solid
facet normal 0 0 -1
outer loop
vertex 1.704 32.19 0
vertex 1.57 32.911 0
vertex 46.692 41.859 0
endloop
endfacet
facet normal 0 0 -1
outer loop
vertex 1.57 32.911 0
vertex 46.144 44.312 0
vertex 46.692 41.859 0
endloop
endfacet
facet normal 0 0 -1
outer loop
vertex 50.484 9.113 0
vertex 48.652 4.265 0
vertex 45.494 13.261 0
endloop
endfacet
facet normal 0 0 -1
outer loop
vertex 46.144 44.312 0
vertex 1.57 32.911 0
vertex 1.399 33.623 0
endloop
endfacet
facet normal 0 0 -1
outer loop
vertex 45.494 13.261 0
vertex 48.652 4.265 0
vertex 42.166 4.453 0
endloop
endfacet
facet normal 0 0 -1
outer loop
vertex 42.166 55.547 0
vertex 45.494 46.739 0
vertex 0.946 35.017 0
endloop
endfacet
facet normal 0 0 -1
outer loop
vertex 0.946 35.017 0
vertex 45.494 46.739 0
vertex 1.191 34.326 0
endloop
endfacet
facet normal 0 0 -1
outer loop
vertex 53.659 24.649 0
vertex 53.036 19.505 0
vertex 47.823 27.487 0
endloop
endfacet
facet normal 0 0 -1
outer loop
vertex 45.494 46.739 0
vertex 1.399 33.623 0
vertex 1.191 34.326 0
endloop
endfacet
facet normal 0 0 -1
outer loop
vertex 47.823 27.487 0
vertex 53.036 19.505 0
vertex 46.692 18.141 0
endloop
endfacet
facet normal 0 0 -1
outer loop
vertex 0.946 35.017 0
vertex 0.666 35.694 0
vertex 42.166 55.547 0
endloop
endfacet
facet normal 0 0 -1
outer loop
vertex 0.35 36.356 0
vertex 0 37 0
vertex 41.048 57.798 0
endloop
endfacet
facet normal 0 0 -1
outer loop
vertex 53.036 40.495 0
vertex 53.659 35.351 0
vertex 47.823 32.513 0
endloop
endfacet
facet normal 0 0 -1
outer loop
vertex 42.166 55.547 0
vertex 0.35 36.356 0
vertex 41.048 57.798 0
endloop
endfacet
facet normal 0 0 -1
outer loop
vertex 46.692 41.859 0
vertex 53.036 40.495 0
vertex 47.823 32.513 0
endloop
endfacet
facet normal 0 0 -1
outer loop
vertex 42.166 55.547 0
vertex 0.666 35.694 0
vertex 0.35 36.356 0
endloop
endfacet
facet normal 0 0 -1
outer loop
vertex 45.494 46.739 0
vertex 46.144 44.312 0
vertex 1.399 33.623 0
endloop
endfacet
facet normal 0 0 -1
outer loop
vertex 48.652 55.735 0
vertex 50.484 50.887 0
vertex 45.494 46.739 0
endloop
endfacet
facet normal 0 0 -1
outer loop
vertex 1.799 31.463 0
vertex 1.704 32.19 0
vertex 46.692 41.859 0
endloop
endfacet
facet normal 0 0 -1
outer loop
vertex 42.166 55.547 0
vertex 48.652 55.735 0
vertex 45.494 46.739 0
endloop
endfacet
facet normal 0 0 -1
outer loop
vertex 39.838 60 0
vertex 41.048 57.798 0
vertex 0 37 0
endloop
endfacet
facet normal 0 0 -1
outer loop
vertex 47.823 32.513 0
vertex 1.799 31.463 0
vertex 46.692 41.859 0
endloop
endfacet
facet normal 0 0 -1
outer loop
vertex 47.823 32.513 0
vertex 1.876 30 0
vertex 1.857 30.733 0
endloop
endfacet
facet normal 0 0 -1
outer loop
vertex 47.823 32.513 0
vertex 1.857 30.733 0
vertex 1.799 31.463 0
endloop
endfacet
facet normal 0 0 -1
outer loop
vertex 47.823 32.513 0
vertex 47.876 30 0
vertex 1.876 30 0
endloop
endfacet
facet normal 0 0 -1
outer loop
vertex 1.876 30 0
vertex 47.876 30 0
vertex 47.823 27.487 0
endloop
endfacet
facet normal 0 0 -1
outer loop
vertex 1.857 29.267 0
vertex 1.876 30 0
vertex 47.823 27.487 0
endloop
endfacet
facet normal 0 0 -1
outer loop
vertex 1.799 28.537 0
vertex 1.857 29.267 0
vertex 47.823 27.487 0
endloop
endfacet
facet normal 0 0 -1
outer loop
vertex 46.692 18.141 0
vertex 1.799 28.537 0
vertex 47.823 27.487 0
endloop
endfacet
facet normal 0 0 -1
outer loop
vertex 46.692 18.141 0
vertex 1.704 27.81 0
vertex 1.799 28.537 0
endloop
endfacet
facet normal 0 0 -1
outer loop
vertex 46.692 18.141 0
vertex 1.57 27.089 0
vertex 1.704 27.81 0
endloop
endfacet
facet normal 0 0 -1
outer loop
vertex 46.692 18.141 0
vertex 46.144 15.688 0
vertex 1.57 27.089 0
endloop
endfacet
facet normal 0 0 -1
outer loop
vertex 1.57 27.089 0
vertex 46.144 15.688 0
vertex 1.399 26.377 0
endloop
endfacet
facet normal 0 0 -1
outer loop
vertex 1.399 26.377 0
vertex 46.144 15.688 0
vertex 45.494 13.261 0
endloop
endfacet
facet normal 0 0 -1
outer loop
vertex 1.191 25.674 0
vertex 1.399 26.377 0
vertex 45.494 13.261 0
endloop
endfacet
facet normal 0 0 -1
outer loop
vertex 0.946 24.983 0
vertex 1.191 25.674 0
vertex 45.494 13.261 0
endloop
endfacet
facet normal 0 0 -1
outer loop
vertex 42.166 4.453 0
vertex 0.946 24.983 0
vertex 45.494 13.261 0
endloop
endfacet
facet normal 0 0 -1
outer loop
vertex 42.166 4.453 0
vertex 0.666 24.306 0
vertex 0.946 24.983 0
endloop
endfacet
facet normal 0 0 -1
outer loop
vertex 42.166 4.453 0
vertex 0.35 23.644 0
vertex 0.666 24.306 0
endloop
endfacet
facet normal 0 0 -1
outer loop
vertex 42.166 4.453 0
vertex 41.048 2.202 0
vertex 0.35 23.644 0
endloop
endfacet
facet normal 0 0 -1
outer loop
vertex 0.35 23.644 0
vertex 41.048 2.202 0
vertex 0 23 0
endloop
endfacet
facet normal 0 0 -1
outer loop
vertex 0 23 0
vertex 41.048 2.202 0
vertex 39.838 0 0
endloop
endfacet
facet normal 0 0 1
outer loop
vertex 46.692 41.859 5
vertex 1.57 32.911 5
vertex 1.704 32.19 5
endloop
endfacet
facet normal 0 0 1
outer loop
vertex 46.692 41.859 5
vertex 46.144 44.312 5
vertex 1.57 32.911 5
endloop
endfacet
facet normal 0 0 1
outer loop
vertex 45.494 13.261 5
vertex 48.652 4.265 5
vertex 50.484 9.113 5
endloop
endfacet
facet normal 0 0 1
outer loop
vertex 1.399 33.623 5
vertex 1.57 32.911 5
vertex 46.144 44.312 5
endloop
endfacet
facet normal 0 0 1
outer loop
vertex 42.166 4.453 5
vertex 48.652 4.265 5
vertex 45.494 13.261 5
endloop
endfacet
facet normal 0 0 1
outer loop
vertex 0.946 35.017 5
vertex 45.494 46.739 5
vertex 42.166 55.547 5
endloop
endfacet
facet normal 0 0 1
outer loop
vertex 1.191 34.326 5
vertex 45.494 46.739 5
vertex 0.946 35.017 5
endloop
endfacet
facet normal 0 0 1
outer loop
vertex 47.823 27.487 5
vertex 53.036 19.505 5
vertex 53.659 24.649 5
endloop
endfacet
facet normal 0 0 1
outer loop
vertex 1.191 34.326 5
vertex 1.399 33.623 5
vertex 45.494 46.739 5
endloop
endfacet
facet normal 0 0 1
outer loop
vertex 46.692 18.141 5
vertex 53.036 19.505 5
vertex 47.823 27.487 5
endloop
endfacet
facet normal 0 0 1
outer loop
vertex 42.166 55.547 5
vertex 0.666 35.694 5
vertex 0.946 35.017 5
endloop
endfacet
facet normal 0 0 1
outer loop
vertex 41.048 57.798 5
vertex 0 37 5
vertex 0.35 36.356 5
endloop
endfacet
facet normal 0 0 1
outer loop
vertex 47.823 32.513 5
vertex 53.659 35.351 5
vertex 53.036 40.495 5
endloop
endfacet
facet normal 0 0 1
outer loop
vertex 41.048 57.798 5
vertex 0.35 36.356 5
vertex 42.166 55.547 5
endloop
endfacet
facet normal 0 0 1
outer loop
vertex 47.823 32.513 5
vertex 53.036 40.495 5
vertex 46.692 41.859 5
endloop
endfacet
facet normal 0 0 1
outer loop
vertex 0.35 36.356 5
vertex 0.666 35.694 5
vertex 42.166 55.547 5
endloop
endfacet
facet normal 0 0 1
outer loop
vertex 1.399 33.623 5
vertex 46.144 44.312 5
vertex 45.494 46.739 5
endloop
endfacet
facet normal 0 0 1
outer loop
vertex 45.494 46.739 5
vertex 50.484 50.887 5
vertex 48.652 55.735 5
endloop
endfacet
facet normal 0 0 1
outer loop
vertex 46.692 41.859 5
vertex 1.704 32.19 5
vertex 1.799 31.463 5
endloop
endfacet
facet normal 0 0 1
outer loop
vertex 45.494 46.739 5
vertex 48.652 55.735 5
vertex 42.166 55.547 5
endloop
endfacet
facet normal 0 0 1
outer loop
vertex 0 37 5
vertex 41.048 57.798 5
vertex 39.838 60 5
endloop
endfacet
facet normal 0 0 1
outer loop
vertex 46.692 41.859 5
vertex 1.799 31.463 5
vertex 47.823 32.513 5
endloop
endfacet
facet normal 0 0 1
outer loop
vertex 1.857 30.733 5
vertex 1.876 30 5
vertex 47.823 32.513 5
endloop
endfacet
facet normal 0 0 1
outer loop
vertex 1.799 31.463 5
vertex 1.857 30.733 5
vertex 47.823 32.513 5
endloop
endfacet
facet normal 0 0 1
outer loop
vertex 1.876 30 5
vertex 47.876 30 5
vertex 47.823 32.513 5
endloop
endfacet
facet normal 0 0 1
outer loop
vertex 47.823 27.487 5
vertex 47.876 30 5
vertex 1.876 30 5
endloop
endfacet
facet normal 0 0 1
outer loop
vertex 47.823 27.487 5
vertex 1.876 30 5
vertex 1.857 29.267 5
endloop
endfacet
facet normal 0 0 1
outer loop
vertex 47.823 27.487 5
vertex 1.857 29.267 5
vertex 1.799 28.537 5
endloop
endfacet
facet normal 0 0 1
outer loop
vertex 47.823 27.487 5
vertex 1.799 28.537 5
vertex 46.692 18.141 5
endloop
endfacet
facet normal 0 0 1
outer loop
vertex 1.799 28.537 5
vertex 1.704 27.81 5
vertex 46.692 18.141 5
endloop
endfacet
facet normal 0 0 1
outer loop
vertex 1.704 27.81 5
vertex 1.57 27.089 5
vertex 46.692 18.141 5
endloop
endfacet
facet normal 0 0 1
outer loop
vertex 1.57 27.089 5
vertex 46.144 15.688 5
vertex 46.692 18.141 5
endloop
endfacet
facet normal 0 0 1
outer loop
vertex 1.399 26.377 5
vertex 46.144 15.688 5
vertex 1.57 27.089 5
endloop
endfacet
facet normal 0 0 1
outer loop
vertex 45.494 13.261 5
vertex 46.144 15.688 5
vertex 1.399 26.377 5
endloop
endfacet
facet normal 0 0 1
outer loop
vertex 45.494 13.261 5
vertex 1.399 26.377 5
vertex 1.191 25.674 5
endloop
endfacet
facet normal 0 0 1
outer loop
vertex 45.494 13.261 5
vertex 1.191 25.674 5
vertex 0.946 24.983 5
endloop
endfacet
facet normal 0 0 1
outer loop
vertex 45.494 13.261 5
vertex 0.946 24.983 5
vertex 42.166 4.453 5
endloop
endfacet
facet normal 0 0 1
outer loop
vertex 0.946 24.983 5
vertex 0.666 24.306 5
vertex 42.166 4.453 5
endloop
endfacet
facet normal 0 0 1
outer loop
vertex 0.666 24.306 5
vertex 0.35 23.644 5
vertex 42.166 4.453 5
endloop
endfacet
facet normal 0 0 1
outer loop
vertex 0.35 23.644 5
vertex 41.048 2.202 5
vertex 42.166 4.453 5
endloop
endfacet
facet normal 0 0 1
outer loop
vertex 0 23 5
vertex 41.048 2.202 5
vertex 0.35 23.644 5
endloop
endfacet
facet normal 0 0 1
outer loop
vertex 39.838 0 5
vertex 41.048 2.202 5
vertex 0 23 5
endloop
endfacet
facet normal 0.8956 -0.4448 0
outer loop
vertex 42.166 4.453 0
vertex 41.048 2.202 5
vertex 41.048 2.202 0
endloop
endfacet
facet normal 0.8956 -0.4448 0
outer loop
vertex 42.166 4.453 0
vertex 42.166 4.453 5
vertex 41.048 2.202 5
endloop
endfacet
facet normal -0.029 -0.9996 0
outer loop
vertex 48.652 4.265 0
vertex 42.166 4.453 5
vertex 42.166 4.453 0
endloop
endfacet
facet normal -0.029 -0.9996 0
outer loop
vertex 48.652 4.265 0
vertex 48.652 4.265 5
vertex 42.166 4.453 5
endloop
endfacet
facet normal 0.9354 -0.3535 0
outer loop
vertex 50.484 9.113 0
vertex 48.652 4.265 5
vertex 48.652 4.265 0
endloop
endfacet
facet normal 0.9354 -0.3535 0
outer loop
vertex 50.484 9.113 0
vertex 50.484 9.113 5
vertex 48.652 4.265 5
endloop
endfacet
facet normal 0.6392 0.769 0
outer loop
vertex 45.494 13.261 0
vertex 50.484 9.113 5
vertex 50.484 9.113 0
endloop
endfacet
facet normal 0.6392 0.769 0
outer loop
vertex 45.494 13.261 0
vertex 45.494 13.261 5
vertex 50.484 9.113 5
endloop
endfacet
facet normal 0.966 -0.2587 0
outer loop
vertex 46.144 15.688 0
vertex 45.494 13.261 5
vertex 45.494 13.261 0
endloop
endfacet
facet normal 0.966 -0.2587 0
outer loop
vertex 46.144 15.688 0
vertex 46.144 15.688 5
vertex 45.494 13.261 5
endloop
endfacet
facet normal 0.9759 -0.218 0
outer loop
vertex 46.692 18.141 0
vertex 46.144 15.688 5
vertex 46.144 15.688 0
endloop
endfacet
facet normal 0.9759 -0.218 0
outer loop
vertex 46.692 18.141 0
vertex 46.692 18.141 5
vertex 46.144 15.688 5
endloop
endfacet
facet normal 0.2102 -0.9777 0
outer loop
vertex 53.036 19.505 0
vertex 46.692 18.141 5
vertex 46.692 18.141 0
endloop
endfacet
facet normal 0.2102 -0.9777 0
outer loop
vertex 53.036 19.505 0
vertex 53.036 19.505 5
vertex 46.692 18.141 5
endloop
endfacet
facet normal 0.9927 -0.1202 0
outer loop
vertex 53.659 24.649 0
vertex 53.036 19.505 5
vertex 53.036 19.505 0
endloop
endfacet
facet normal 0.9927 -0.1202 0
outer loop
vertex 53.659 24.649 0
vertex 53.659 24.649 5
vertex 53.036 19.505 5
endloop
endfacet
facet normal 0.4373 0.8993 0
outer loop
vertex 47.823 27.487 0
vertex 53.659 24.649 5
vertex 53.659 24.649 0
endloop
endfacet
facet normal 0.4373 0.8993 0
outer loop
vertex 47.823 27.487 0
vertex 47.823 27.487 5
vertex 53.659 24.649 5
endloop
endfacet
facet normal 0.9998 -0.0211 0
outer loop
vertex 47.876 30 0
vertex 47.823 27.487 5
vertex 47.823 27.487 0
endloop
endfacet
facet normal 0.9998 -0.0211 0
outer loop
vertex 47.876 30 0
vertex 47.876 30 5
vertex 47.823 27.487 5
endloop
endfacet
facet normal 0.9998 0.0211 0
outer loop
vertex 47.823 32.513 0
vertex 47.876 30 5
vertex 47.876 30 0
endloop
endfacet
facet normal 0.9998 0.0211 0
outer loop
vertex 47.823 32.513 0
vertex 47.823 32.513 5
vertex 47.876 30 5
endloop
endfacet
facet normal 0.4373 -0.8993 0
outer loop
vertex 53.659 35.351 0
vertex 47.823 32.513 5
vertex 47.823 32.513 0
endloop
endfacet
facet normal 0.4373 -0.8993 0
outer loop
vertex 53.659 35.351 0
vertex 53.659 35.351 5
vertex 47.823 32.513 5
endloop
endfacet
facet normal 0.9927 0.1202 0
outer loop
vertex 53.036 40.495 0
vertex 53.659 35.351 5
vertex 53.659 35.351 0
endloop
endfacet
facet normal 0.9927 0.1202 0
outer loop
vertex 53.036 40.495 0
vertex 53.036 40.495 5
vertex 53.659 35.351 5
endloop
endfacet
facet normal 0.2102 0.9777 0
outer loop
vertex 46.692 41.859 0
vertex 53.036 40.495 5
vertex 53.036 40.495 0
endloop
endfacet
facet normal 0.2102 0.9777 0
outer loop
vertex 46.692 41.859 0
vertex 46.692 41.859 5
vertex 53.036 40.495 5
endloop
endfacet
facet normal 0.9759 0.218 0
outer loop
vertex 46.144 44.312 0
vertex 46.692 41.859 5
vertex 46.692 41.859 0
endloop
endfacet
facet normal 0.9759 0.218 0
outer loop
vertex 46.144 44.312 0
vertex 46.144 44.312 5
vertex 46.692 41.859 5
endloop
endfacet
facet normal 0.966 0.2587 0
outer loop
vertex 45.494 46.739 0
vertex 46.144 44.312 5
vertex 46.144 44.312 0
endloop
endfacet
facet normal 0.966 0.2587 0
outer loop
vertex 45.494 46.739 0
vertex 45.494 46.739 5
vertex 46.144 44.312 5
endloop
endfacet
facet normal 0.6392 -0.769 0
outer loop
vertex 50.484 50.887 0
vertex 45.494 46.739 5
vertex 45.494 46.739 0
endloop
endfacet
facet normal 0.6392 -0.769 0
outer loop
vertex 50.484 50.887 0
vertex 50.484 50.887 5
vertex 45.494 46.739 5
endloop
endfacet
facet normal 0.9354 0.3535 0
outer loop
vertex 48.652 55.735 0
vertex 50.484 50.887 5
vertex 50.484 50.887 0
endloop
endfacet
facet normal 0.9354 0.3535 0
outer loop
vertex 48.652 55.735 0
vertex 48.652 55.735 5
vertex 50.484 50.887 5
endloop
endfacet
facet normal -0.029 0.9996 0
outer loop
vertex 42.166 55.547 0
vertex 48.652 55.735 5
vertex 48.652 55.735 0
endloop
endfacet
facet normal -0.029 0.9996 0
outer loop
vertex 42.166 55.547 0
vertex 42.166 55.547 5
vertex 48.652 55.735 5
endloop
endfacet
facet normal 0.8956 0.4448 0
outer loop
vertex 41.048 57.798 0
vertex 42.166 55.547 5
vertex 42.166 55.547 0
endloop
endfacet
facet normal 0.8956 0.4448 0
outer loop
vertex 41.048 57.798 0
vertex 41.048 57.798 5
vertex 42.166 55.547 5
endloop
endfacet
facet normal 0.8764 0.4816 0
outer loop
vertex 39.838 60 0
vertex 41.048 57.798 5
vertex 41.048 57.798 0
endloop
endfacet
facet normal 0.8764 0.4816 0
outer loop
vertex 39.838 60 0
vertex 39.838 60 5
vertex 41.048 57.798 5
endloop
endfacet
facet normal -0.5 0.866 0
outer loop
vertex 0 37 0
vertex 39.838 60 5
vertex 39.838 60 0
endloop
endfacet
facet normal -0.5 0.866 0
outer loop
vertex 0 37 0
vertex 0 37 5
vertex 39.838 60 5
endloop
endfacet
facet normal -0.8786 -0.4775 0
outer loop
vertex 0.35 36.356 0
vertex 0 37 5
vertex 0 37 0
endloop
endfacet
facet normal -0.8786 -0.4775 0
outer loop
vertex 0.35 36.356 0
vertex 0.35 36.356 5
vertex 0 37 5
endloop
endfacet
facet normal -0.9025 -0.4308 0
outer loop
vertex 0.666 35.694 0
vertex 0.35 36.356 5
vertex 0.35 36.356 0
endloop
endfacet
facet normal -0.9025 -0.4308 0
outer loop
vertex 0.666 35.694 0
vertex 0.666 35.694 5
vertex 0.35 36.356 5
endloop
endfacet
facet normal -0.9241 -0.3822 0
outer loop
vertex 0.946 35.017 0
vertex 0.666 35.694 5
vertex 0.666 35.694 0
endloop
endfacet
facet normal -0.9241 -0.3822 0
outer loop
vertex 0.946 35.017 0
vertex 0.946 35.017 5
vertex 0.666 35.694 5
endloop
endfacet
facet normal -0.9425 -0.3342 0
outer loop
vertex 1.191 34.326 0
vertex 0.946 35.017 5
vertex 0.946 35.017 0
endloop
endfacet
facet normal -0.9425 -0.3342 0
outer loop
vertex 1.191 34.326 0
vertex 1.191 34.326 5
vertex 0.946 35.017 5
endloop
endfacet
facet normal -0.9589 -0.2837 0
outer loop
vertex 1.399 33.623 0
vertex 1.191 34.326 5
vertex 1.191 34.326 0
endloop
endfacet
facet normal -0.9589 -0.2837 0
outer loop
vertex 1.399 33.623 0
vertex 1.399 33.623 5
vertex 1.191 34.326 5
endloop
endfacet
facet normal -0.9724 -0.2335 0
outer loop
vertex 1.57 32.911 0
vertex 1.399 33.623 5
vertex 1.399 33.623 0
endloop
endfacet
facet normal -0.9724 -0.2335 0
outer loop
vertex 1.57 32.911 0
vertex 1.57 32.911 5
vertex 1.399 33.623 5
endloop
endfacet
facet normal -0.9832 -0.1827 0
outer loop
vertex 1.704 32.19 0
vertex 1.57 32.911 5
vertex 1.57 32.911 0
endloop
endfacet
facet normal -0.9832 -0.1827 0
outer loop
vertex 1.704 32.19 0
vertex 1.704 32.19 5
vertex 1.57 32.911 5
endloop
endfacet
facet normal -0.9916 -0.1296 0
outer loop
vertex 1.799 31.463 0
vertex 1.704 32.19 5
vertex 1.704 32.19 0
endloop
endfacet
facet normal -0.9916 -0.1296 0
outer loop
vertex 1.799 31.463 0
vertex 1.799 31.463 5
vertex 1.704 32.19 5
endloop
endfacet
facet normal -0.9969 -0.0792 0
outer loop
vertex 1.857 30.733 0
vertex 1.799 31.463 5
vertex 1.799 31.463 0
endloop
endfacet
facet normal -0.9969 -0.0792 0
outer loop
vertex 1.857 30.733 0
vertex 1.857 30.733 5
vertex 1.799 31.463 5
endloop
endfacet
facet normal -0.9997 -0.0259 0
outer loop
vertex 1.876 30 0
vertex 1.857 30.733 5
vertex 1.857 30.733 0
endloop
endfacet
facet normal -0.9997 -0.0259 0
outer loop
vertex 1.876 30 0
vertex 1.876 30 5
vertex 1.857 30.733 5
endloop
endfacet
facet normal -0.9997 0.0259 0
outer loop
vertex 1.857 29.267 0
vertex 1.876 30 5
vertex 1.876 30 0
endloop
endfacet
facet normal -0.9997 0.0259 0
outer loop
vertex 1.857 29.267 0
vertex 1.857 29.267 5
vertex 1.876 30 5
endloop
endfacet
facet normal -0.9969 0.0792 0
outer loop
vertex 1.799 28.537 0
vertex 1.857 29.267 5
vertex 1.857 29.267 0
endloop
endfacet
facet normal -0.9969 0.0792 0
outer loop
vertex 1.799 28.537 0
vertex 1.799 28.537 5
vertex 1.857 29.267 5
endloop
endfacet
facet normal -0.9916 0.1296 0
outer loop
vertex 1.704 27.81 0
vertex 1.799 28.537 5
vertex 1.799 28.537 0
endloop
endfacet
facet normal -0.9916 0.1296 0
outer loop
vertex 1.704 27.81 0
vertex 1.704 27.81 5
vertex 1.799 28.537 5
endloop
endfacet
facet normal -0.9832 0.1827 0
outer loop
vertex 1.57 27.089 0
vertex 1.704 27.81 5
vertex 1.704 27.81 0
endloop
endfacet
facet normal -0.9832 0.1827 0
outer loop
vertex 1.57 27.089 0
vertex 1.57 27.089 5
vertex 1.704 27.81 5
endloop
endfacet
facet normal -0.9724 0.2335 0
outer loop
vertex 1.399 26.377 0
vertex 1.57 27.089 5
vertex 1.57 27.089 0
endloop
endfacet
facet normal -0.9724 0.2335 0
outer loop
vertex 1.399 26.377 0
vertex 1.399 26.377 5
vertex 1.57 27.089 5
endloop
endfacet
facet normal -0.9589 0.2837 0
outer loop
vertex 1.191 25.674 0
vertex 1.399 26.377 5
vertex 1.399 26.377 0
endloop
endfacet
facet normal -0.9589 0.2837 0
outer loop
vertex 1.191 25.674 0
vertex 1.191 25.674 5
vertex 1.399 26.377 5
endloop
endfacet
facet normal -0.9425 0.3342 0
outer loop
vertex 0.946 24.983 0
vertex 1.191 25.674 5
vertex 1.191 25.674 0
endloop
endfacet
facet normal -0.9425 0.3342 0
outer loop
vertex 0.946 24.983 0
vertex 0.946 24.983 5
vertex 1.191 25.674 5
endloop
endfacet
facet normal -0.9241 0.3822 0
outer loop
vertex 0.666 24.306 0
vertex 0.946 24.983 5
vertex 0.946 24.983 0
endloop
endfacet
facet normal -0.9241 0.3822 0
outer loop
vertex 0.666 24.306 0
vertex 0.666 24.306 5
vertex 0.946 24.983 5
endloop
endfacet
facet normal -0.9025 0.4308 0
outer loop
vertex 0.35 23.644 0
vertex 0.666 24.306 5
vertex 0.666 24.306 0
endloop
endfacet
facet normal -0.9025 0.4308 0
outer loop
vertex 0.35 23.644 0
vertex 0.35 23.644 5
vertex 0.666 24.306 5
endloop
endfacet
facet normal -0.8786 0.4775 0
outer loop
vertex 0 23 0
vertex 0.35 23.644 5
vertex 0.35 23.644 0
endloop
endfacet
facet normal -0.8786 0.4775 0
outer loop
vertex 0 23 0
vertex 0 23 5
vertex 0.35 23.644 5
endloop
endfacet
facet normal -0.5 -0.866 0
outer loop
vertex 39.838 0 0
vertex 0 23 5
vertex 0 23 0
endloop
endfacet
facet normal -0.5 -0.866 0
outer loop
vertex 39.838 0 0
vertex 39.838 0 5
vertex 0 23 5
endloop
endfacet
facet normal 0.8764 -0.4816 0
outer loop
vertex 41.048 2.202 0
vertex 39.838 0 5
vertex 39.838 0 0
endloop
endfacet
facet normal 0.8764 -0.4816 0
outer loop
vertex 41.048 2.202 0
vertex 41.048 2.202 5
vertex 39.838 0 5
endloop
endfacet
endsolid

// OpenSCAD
$fn = 32;

// ----------------------------------------------------------------------
// Gear sector: 4 teeth on 60 degrees
// ----------------------------------------------------------------------

// --- parameters (mm) ---
sector_angle = 60;        // sector angle, degrees
root_r = 60;              // root circle radius
tooth_h = 6;              // tooth height over the root circle
teeth = 4;                // number of teeth on the sector
hub_r = 14;               // hub bore radius
plate_t = 5;              // sector thickness, Z
arc_step = 3;             // sampling step of the root/hub arcs, degrees

tip_r = root_r + tooth_h;  // tip circle radius

profile = [[39.838, 0], [41.048, 2.202], [42.166, 4.453], [48.652, 4.265], [50.484, 9.113], [45.494, 13.261], [46.144, 15.688], [46.692, 18.141], [53.036, 19.505], [53.659, 24.649], [47.823, 27.487], [47.876, 30], [47.823, 32.513], [53.659, 35.351], [53.036, 40.495], [46.692, 41.859], [46.144, 44.312], [45.494, 46.739], [50.484, 50.887], [48.652, 55.735], [42.166, 55.547], [41.048, 57.798], [39.838, 60], [0, 37], [0.35, 36.356], [0.666, 35.694], [0.946, 35.017], [1.191, 34.326], [1.399, 33.623], [1.57, 32.911], [1.704, 32.19], [1.799, 31.463], [1.857, 30.733], [1.876, 30], [1.857, 29.267], [1.799, 28.537], [1.704, 27.81], [1.57, 27.089], [1.399, 26.377], [1.191, 25.674], [0.946, 24.983], [0.666, 24.306], [0.35, 23.644], [0, 23]];  // primary outline, 44 points, counter clockwise

// --- the one profile operation ---
linear_extrude(height = plate_t) polygon(points = profile);
